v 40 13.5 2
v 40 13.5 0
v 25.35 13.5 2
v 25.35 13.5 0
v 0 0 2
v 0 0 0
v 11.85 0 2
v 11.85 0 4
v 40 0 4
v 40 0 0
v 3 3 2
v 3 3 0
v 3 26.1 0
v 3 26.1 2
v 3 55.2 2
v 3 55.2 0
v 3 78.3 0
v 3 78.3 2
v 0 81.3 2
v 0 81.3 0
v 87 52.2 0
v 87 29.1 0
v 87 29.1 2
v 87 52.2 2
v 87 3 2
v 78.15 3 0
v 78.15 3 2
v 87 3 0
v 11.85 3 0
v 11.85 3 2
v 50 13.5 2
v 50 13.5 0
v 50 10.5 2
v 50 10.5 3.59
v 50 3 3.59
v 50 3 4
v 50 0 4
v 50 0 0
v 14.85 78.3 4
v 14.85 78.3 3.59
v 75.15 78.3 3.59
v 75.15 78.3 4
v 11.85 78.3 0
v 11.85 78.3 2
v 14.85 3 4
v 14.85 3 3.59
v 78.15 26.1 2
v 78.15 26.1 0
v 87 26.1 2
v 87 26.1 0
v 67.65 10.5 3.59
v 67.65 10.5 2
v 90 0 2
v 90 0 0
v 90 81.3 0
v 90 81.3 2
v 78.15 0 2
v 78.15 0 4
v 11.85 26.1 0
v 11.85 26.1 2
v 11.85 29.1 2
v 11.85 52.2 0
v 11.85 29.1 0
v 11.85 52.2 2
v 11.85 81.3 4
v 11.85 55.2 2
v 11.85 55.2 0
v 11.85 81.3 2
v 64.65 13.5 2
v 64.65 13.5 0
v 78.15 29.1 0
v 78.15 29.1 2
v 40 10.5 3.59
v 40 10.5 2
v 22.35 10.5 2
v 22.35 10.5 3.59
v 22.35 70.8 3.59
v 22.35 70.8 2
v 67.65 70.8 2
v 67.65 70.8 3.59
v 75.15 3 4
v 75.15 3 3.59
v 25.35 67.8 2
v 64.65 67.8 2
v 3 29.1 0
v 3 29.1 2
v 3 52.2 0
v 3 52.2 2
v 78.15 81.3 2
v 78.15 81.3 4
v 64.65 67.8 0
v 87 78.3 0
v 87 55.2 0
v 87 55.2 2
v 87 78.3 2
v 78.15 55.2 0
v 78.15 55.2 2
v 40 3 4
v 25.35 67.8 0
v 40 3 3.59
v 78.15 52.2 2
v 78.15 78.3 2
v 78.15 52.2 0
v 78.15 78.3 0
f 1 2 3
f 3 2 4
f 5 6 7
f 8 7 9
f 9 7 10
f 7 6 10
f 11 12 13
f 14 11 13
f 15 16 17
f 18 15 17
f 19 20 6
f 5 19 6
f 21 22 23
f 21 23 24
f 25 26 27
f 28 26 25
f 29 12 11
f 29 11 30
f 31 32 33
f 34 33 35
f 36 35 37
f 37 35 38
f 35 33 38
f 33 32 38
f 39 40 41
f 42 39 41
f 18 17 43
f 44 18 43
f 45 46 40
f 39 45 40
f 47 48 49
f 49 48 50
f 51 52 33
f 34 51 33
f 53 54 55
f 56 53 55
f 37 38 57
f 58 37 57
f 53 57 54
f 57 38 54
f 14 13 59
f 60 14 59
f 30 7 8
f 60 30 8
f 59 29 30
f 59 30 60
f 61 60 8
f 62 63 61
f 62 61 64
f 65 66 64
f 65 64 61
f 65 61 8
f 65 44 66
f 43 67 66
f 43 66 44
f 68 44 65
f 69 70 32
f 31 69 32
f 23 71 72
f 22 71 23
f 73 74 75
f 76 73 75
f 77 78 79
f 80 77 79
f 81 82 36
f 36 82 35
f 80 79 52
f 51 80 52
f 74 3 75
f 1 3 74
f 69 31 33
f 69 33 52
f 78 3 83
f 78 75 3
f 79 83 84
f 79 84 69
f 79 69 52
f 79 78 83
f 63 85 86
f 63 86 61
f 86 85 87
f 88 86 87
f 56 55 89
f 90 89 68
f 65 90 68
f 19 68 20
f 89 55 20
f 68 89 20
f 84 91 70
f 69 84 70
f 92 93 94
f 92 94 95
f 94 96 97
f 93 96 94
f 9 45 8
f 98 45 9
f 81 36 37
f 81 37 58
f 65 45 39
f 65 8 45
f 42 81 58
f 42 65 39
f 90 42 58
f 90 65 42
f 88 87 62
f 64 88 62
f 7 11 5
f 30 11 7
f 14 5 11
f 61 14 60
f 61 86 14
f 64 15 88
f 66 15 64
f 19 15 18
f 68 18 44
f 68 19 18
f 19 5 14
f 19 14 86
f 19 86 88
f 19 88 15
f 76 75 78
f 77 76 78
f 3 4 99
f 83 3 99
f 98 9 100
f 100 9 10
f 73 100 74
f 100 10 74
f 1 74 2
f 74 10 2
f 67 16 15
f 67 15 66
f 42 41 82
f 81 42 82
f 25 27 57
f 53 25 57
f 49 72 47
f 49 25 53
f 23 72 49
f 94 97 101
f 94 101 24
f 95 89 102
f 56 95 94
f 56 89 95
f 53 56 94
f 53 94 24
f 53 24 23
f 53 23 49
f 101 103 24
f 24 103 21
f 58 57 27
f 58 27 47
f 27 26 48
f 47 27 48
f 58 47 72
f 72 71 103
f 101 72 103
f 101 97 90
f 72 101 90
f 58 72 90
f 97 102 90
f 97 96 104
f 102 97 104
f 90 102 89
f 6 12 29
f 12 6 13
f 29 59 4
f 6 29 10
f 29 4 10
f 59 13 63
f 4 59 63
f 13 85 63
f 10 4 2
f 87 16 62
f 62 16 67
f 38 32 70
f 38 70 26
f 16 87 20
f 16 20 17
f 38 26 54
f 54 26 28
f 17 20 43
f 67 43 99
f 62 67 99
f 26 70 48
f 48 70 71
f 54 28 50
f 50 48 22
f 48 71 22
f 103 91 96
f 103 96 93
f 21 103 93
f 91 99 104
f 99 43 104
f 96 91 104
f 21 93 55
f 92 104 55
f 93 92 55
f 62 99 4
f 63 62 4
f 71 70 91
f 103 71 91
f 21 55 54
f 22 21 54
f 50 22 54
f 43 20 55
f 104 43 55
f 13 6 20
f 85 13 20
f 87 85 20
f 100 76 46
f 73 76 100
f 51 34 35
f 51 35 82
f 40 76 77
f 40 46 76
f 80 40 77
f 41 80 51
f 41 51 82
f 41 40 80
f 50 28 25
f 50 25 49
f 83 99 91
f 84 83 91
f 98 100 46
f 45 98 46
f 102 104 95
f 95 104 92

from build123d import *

# Parameters (mm, degrees)
SKETCH1_W           = 8.85
SKETCH1_H           = 23.1
BOSS_EXTRUDE1_DEPTH = 2
BOSS_EXTRUDE2_DEPTH = 3.59
BOSS_EXTRUDE3_DEPTH = 4


with BuildPart() as part:
    # Sketch1 → Boss-Extrude1 (new body)
    with BuildSketch(Plane.XY):
        Polygon((0, 81.3), (0, 0), (40, 0), (40, 13.5), (25.35, 13.5), (25.35, 67.8), (64.65, 67.8), (64.65, 13.5), (50, 13.5), (50, 0), (90, 0), (90, 81.3), align=None)
        with Locations((82.575, 14.55)):
            Rectangle(SKETCH1_W, SKETCH1_H, mode=Mode.SUBTRACT)
        with Locations((82.575, 40.65)):
            Rectangle(SKETCH1_W, SKETCH1_H, mode=Mode.SUBTRACT)
        with Locations((82.575, 66.75)):
            Rectangle(SKETCH1_W, SKETCH1_H, mode=Mode.SUBTRACT)
        with Locations((7.425, 66.75)):
            Rectangle(SKETCH1_W, SKETCH1_H, mode=Mode.SUBTRACT)
        with Locations((7.425, 40.65)):
            Rectangle(SKETCH1_W, SKETCH1_H, mode=Mode.SUBTRACT)
        with Locations((7.425, 14.55)):
            Rectangle(SKETCH1_W, SKETCH1_H, mode=Mode.SUBTRACT)
    extrude(amount=BOSS_EXTRUDE1_DEPTH)

    # Sketch1<3> → Boss-Extrude2 (add)
    with BuildSketch(Plane.XY):
        Polygon((14.85, 3), (40, 3), (40, 10.5), (22.35, 10.5), (22.35, 70.8), (67.65, 70.8), (67.65, 10.5), (50, 10.5), (50, 3), (75.15, 3), (75.15, 78.3), (14.85, 78.3), align=None)
    extrude(amount=BOSS_EXTRUDE2_DEPTH)

    # Sketch1<4> → Boss-Extrude3 (add)
    with BuildSketch(Plane.XY):
        Polygon((11.85, 3), (11.85, 0), (40, 0), (40, 3), (14.85, 3), (14.85, 78.3), (75.15, 78.3), (75.15, 3), (50, 3), (50, 0), (78.15, 0), (78.15, 3), (78.15, 26.1), (78.15, 29.1), (78.15, 52.2), (78.15, 55.2), (78.15, 78.3), (78.15, 81.3), (11.85, 81.3), (11.85, 78.3), (11.85, 55.2), (11.85, 52.2), (11.85, 29.1), (11.85, 26.1), align=None)
    extrude(amount=BOSS_EXTRUDE3_DEPTH)


solid = part.part
